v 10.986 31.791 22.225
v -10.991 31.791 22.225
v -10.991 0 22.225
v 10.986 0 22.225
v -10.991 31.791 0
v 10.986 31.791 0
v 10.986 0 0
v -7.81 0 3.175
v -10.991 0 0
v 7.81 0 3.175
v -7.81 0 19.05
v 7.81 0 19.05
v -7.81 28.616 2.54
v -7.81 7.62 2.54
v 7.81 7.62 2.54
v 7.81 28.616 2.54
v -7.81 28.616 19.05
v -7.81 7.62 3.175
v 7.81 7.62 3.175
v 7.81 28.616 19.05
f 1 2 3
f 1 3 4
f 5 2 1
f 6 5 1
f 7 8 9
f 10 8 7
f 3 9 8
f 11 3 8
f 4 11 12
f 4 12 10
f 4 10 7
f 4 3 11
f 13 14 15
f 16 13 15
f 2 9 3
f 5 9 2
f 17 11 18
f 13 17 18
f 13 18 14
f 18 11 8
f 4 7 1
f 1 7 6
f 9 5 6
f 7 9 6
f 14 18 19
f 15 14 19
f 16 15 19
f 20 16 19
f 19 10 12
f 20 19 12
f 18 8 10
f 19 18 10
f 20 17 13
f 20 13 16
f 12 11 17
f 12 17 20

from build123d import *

# Parameters (mm, degrees)
F2_W     = 21.976557381
F2_H     = 31.7907221615
F3_DEPTH = 22.225
F1_W     = 15.621
F1_H     = 15.875
F1_H_2   = 0.635
F4_DEPTH = 28.6157221615
F5_DEPTH = 7.62


with BuildPart() as f3:
    # F2 (on Top) → F3 (new body)
    with BuildSketch(Plane.XY):
        with Locations((-0.0027786905, 15.8953610808)):
            Rectangle(F2_W, F2_H)
    extrude(amount=F3_DEPTH)

    # F1 (on Front) → F4 (cut, through all)
    with BuildSketch(Plane.XZ):
        with Locations((0, 11.1125)):
            Rectangle(F1_W, F1_H)
        with Locations((0, 2.8575)):
            Rectangle(F1_W, F1_H_2)
    extrude(amount=-F4_DEPTH, mode=Mode.SUBTRACT)

    # F1 (on Front) → F5 (join)
    with BuildSketch(Plane.XZ):
        with Locations((0, 2.8575)):
            Rectangle(F1_W, F1_H_2)
    extrude(amount=-F5_DEPTH)


solid = f3.part
